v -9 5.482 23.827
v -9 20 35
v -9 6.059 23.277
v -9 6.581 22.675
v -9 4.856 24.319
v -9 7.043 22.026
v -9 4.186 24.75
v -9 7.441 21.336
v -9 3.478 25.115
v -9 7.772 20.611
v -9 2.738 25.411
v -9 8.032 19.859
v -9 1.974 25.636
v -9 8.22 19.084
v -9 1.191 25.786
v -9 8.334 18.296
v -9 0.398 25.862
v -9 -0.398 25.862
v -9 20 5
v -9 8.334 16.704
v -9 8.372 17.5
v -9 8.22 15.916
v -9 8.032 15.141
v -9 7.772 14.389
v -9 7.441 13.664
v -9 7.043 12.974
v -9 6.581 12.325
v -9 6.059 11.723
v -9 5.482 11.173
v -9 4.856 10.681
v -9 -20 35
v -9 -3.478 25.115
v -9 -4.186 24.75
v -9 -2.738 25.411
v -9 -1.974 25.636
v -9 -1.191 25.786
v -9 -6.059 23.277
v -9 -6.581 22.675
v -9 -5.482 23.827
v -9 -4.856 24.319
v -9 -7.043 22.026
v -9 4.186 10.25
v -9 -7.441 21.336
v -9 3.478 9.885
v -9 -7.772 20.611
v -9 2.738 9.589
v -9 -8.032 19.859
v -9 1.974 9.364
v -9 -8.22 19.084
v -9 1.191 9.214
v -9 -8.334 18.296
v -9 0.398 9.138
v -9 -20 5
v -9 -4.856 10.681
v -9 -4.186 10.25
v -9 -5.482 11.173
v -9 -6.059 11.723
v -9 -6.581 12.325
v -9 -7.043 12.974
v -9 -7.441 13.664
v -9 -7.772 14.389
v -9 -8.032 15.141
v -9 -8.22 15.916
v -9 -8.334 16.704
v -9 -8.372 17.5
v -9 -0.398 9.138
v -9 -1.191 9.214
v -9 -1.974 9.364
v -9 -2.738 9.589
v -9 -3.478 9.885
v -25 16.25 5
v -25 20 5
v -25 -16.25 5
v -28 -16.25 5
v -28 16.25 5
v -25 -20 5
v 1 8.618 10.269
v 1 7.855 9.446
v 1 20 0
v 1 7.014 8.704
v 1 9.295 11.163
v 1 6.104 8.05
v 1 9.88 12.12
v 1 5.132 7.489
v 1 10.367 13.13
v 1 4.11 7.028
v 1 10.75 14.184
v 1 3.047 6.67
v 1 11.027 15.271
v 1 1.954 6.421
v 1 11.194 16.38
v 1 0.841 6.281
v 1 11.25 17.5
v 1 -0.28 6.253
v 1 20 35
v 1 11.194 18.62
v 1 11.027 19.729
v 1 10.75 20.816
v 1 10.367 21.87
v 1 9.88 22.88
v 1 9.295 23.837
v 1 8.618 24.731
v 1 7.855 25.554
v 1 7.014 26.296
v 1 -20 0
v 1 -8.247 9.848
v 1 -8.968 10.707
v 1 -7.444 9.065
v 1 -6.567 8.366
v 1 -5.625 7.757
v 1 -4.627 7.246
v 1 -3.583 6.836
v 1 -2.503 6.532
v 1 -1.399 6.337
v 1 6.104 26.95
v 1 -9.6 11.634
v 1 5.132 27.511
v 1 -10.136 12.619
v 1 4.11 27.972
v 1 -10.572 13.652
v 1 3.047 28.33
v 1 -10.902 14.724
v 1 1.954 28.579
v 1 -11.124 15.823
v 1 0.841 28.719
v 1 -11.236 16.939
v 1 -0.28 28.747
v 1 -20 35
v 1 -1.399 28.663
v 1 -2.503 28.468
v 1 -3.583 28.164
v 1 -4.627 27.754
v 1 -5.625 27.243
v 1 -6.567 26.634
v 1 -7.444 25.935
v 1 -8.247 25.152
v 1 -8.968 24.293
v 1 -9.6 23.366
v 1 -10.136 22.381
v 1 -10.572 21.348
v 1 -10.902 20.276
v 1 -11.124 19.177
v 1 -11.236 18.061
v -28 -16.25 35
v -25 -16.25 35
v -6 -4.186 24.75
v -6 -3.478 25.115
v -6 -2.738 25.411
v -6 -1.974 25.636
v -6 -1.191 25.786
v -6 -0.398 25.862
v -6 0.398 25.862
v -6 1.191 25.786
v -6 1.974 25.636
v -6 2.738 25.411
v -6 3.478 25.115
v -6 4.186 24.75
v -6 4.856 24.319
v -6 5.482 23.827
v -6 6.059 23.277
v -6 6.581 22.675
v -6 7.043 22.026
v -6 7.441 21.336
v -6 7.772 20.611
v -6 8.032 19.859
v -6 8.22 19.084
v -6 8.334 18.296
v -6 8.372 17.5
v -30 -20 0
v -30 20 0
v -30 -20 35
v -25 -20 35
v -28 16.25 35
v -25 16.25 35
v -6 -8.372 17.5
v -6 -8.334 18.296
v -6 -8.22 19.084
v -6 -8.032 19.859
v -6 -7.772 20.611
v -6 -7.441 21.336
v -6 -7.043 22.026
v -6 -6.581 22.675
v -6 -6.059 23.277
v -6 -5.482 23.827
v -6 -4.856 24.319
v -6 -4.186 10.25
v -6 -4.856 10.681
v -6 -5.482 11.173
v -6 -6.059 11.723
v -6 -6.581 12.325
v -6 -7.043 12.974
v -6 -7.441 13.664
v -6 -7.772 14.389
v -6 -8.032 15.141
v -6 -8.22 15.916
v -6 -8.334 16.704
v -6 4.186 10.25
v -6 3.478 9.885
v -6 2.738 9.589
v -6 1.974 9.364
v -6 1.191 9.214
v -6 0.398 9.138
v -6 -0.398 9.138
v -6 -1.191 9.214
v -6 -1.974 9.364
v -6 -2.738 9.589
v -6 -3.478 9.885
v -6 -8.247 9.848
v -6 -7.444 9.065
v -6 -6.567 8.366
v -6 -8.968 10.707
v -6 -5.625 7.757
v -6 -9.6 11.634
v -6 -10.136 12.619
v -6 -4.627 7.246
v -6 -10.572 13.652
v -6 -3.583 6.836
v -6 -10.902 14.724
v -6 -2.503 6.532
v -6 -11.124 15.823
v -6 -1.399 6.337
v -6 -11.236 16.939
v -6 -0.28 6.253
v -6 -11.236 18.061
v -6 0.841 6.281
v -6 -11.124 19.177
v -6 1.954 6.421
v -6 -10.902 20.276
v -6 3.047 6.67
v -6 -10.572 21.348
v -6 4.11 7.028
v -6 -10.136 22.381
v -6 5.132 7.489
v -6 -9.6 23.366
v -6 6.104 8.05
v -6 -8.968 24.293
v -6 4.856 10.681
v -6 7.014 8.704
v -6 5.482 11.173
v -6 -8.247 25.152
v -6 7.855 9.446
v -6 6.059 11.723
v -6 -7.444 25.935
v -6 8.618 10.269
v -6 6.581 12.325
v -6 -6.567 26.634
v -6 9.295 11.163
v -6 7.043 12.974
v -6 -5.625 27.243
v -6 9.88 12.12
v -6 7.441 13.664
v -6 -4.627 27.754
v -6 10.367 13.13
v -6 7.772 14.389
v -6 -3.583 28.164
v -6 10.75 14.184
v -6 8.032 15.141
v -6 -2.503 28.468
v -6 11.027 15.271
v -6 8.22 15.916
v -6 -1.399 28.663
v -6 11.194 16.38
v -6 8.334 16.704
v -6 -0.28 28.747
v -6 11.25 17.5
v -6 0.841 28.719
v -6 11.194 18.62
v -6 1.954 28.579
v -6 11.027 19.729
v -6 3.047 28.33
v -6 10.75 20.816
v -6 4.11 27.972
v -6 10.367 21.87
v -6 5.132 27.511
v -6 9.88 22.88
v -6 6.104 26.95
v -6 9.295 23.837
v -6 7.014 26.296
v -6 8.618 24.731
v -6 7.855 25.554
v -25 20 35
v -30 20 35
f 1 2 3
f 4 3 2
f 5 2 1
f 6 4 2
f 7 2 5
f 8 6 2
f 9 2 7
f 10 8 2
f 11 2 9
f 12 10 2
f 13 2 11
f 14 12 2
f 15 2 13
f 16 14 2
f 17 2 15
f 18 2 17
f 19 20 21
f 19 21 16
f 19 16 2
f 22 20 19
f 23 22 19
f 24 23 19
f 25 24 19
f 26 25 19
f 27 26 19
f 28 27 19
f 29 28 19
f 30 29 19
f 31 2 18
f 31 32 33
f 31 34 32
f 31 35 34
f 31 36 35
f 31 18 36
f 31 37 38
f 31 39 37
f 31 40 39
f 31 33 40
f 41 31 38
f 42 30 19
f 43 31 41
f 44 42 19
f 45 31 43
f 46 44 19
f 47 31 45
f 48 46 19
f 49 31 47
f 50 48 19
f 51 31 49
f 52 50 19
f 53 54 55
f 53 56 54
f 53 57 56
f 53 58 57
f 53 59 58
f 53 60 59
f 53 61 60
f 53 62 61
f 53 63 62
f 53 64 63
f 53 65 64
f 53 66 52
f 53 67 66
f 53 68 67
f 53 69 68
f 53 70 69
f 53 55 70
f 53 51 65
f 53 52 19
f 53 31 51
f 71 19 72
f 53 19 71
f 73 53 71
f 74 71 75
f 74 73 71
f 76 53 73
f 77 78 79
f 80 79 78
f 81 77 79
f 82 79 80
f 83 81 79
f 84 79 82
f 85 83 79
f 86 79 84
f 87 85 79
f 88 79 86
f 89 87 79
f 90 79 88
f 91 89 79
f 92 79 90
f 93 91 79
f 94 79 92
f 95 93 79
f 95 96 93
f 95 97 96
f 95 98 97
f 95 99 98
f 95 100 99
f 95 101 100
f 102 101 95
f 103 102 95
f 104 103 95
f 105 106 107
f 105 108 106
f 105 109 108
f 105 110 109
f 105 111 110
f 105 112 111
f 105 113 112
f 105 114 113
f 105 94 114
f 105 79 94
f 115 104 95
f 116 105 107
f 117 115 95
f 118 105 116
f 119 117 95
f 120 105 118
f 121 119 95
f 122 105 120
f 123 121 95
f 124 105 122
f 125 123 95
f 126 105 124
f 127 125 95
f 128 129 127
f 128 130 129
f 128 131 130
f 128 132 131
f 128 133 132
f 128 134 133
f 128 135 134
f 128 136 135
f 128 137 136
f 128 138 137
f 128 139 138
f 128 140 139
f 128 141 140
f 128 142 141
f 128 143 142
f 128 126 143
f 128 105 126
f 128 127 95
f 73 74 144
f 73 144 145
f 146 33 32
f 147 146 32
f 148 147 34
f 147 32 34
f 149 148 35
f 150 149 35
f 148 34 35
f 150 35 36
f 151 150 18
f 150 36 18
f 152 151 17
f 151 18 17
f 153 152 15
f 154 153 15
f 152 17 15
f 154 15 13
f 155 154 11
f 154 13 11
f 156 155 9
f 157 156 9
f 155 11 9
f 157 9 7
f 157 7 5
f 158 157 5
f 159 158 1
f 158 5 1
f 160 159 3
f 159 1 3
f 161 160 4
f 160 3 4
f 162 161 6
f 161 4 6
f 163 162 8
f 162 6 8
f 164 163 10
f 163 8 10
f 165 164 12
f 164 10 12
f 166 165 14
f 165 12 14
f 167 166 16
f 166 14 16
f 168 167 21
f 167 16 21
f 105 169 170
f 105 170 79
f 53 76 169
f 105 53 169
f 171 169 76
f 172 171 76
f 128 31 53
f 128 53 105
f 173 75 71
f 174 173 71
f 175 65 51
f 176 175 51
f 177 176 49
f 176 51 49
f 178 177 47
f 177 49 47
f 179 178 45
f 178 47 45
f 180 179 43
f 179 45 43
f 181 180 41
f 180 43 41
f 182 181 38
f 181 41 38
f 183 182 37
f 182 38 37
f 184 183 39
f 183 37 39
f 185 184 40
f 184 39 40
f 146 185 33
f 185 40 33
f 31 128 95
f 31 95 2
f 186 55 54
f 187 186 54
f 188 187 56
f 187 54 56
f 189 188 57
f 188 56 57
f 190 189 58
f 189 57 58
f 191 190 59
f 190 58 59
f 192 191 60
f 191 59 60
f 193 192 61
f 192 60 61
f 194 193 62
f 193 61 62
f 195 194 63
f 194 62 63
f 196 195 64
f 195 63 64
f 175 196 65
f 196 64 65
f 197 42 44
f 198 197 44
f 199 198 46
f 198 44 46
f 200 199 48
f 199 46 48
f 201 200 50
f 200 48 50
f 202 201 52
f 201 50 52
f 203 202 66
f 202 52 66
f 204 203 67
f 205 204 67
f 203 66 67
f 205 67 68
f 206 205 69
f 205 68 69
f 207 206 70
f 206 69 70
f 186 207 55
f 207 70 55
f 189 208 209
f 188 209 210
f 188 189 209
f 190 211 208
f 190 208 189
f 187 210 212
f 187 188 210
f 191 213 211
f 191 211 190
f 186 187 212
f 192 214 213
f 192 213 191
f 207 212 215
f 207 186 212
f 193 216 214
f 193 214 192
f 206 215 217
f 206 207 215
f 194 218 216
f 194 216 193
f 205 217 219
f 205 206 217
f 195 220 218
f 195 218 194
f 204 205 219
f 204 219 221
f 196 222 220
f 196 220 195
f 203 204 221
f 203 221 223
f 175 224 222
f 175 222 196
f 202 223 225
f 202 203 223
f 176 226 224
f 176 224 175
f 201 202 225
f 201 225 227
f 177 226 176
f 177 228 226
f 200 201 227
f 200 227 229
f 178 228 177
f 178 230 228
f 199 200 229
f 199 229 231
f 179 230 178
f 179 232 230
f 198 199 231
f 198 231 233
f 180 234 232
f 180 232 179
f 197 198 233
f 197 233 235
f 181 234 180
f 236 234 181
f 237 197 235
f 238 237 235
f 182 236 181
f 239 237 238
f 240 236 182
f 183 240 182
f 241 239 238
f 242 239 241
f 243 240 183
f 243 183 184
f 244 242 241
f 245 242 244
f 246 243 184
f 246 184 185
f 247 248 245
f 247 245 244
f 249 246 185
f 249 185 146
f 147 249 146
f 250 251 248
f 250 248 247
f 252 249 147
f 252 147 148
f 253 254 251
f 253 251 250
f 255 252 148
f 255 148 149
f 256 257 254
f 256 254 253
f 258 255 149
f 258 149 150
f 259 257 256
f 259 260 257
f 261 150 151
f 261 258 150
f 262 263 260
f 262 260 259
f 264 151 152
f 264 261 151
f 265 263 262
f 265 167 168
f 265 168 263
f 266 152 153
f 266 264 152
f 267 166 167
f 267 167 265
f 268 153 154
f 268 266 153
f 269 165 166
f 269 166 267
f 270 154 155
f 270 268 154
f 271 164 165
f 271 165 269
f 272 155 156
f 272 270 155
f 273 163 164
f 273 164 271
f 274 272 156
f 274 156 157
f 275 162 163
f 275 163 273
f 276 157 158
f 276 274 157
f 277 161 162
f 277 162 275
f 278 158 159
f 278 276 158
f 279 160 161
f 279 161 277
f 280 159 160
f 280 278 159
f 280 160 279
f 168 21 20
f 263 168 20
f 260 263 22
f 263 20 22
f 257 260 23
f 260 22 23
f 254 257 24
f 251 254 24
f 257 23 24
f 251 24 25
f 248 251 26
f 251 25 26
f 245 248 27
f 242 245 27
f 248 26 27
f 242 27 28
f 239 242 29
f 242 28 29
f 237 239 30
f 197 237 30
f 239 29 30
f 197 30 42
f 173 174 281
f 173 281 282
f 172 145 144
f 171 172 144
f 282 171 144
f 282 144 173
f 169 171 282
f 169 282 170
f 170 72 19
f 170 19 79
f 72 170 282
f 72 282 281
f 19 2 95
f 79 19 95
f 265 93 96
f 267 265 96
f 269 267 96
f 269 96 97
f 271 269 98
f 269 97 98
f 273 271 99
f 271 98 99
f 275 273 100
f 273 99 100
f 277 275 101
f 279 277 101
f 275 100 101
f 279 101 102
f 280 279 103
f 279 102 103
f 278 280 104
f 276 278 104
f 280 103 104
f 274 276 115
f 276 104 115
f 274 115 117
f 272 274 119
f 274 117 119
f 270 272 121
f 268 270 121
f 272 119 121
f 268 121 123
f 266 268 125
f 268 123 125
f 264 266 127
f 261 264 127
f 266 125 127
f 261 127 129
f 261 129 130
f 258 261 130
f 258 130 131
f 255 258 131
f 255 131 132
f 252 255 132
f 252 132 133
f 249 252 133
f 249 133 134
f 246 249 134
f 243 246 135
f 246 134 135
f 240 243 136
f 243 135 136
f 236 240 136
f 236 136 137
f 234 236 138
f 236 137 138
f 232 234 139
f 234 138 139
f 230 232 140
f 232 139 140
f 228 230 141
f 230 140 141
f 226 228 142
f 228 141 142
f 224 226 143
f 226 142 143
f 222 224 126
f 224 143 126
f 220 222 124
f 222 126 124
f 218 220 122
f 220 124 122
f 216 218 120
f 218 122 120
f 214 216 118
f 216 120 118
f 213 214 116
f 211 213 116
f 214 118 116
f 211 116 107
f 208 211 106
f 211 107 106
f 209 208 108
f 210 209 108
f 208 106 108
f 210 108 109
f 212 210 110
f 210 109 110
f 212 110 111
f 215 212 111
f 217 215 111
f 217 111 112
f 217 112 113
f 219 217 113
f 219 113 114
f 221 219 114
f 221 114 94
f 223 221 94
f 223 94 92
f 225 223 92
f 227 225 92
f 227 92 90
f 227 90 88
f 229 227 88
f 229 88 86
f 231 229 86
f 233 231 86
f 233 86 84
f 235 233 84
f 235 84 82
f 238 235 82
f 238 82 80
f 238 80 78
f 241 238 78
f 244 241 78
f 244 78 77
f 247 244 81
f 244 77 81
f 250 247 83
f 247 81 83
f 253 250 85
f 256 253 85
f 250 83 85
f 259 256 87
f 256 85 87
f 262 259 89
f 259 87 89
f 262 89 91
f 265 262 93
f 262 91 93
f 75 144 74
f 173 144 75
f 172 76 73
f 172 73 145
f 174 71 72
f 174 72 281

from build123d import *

# Parameters (mm, degrees)
F1_DEPTH = 20
F2_R     = 11.25
F3_DEPTH = 7
F4_R     = 6.75
F5_DEPTH = 5
F6_W     = 3
F6_H     = 32.5
F7_DEPTH = 30
F8_R     = 6.75
F9_DEPTH = 25


with BuildPart() as f1:
    # F0 (on Front) → F1 (new body, symmetric)
    with BuildSketch(Plane.XZ):
        Polygon((-25, 35), (-30, 35), (-30, 0), (1, 0), (1, 35), (-9, 35), (-9, 5), (-25, 5), align=None)
    extrude(amount=F1_DEPTH, both=True)

    # F2 (on face) → F3 (cut)
    with BuildSketch(Plane.YZ.offset(1)):
        with Locations((0, 17.5)):
            Circle(F2_R)
    extrude(amount=-F3_DEPTH, mode=Mode.SUBTRACT)

    # F4 (on face) → F5 (cut)
    with BuildSketch(Plane.YZ.offset(-6)):
        with Locations((0, 17.5)):
            Circle(F4_R)
    extrude(amount=-F5_DEPTH, mode=Mode.SUBTRACT)

    # F6 (on face) → F7 (cut)
    with BuildSketch(Plane.XY.offset(35)):
        with Locations((-26.5, 0)):
            Rectangle(F6_W, F6_H)
    extrude(amount=-F7_DEPTH, mode=Mode.SUBTRACT)

    # F8 (on face) → F9 (cut)
    with BuildSketch(Plane(origin=(-9, 0, 0), x_dir=(0, -1, 0), z_dir=(-1, 0, 0))):
        Polygon((4.1857894516, 24.75), (-4.1857894516, 24.75), (-8.3715789032, 17.5), (-4.1857894516, 10.25), (4.1857894516, 10.25), (8.3715789032, 17.5), align=None)
        with Locations((0, 17.5)):
            Circle(F8_R, mode=Mode.SUBTRACT)
        with Locations((0, 17.5)):
            Circle(F8_R)
        with BuildLine():
            ThreePointArc((4.1857894516, 24.75), (0, 25.8715789032), (-4.1857894516, 24.75))
            Line((-4.1857894516, 24.75), (4.1857894516, 24.75))
        make_face()
        with BuildLine():
            Line((-8.3715789032, 17.5), (-4.1857894516, 24.75))
            ThreePointArc((-4.1857894516, 24.75), (-7.25, 21.6857894516), (-8.3715789032, 17.5))
        make_face()
        with BuildLine():
            ThreePointArc((8.3715789032, 17.5), (7.25, 21.6857894516), (4.1857894516, 24.75))
            Line((4.1857894516, 24.75), (8.3715789032, 17.5))
        make_face()
        with BuildLine():
            Line((-4.1857894516, 10.25), (-8.3715789032, 17.5))
            ThreePointArc((-8.3715789032, 17.5), (-7.25, 13.3142105484), (-4.1857894516, 10.25))
        make_face()
        with BuildLine():
            ThreePointArc((4.1857894516, 10.25), (7.25, 13.3142105484), (8.3715789032, 17.5))
            Line((8.3715789032, 17.5), (4.1857894516, 10.25))
        make_face()
        with BuildLine():
            Line((4.1857894516, 10.25), (-4.1857894516, 10.25))
            ThreePointArc((-4.1857894516, 10.25), (0, 9.1284210968), (4.1857894516, 10.25))
        make_face()
    extrude(amount=-F9_DEPTH, mode=Mode.SUBTRACT)


solid = f1.part
